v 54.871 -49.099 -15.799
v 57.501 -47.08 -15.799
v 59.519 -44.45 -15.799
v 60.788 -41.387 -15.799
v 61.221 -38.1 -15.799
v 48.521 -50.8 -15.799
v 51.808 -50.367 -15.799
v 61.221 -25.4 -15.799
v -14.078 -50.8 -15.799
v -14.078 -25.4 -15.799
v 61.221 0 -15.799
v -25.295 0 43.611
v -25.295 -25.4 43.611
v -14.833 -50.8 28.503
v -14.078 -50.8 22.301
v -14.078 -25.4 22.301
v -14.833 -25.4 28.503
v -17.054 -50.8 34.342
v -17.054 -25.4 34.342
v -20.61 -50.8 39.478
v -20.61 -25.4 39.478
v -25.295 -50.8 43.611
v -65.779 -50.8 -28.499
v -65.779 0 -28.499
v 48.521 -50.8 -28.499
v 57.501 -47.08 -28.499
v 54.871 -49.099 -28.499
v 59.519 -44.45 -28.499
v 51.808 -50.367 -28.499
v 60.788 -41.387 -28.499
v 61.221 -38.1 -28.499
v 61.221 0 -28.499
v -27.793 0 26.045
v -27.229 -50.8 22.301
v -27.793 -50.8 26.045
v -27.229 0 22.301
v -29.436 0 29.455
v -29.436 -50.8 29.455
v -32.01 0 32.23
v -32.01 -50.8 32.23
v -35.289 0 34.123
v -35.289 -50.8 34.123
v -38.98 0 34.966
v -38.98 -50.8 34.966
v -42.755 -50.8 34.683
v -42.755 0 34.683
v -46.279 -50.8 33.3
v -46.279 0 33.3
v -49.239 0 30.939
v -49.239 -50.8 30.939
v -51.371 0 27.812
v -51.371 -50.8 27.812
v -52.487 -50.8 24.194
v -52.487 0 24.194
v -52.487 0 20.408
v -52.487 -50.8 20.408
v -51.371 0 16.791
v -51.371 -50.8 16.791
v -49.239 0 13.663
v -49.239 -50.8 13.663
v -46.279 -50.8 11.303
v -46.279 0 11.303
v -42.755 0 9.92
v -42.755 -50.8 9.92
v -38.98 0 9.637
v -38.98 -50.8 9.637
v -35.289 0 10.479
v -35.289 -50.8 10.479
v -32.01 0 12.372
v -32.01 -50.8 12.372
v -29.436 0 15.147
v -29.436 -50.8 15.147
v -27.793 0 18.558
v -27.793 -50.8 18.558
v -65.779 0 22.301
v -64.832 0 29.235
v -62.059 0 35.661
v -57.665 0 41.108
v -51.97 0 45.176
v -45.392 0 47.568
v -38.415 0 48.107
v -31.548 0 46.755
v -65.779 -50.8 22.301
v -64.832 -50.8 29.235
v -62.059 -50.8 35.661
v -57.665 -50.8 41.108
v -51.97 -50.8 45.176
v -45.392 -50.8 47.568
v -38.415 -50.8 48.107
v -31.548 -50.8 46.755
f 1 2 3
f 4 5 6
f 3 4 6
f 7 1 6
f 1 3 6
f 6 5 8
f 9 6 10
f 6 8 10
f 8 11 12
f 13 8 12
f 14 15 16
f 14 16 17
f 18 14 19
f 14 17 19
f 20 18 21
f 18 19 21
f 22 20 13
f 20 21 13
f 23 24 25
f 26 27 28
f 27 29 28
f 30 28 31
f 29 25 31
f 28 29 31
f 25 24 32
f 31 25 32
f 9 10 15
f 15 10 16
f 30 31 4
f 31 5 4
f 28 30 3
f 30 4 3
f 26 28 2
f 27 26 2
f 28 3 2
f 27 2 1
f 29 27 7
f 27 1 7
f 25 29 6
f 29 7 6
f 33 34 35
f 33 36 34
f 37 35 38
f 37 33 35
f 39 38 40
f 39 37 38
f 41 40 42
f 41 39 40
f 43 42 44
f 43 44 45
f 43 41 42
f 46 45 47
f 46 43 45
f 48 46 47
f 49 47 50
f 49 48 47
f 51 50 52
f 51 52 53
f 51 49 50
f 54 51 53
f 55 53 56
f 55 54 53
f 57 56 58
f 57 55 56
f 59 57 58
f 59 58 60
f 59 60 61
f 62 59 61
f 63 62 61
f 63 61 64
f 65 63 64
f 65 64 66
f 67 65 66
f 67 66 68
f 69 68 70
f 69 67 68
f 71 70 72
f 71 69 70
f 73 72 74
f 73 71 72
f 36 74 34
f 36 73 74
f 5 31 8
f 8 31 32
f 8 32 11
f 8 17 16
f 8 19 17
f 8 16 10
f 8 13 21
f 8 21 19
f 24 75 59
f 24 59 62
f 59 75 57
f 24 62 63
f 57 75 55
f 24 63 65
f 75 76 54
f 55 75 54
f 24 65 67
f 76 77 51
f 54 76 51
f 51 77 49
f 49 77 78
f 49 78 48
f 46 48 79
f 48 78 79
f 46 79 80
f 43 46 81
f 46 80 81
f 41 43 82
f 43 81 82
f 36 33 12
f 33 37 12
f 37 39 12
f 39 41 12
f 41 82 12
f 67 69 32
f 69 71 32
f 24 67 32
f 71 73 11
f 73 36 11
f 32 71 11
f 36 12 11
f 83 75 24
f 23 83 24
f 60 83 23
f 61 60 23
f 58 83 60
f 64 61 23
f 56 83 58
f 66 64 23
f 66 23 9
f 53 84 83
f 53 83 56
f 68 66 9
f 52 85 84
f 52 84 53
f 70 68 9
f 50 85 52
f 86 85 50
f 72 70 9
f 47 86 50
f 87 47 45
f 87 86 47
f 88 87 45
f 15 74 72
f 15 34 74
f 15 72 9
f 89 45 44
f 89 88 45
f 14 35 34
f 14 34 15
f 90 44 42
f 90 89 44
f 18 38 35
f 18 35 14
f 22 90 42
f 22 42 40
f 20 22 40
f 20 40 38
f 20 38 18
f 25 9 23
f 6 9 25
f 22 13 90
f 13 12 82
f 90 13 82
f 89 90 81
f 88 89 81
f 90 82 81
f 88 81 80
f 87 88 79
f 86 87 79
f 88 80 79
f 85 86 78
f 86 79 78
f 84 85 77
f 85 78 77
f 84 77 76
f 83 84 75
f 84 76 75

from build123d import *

# Parameters (mm, degrees)
F0_R     = 12.7
F1_DEPTH = 25.4
F2_R     = 12.7
F3_DEPTH = 25.4
F4_R     = 12.7


with BuildPart() as f1:
    # F0 (on Front) → F1 (new body)
    with BuildSketch(Plane.XZ):
        with BuildLine():
            Line((61.220638, -15.7988), (-25.29539, 43.611169))
            ThreePointArc((-25.29539, 43.611169), (-51.969765, 45.176223), (-65.779362, 22.3012))
            Line((-65.779362, 22.3012), (-65.779362, -28.4988))
            Line((-65.779362, -28.4988), (61.220638, -28.4988))
            Line((61.220638, -28.4988), (61.220638, -15.7988))
        make_face()
        with Locations((-39.928801, 22.3012)):
            Circle(F0_R, mode=Mode.SUBTRACT)
    extrude(amount=F1_DEPTH)

    # F2 (on face) → F3 (join)
    with BuildSketch(Plane.XZ.offset(25.4)):
        with BuildLine():
            Line((61.220638, -28.4988), (61.220638, -15.7988))
            Line((61.220638, -15.7988), (-14.078241, -15.7988))
            Line((-14.078241, -15.7988), (-14.078241, 22.3012))
            ThreePointArc((-14.078241, 22.3012), (-17.053778, 34.342163), (-25.29539, 43.611169))
            ThreePointArc((-25.29539, 43.611169), (-51.969765, 45.176223), (-65.779362, 22.3012))
            Line((-65.779362, 22.3012), (-65.779362, -15.7988))
            Line((-65.779362, -15.7988), (-65.779362, -28.4988))
            Line((-65.779362, -28.4988), (61.220638, -28.4988))
        make_face()
        with Locations((-39.928801, 22.3012)):
            Circle(F2_R, mode=Mode.SUBTRACT)
    extrude(amount=F3_DEPTH)

    # F4
    f4_edges = [f1.edges().sort_by_distance(p)[0] for p in [
        (61.220638, -50.8, -22.1488),
    ]]
    fillet(f4_edges, radius=F4_R)


solid = f1.part
